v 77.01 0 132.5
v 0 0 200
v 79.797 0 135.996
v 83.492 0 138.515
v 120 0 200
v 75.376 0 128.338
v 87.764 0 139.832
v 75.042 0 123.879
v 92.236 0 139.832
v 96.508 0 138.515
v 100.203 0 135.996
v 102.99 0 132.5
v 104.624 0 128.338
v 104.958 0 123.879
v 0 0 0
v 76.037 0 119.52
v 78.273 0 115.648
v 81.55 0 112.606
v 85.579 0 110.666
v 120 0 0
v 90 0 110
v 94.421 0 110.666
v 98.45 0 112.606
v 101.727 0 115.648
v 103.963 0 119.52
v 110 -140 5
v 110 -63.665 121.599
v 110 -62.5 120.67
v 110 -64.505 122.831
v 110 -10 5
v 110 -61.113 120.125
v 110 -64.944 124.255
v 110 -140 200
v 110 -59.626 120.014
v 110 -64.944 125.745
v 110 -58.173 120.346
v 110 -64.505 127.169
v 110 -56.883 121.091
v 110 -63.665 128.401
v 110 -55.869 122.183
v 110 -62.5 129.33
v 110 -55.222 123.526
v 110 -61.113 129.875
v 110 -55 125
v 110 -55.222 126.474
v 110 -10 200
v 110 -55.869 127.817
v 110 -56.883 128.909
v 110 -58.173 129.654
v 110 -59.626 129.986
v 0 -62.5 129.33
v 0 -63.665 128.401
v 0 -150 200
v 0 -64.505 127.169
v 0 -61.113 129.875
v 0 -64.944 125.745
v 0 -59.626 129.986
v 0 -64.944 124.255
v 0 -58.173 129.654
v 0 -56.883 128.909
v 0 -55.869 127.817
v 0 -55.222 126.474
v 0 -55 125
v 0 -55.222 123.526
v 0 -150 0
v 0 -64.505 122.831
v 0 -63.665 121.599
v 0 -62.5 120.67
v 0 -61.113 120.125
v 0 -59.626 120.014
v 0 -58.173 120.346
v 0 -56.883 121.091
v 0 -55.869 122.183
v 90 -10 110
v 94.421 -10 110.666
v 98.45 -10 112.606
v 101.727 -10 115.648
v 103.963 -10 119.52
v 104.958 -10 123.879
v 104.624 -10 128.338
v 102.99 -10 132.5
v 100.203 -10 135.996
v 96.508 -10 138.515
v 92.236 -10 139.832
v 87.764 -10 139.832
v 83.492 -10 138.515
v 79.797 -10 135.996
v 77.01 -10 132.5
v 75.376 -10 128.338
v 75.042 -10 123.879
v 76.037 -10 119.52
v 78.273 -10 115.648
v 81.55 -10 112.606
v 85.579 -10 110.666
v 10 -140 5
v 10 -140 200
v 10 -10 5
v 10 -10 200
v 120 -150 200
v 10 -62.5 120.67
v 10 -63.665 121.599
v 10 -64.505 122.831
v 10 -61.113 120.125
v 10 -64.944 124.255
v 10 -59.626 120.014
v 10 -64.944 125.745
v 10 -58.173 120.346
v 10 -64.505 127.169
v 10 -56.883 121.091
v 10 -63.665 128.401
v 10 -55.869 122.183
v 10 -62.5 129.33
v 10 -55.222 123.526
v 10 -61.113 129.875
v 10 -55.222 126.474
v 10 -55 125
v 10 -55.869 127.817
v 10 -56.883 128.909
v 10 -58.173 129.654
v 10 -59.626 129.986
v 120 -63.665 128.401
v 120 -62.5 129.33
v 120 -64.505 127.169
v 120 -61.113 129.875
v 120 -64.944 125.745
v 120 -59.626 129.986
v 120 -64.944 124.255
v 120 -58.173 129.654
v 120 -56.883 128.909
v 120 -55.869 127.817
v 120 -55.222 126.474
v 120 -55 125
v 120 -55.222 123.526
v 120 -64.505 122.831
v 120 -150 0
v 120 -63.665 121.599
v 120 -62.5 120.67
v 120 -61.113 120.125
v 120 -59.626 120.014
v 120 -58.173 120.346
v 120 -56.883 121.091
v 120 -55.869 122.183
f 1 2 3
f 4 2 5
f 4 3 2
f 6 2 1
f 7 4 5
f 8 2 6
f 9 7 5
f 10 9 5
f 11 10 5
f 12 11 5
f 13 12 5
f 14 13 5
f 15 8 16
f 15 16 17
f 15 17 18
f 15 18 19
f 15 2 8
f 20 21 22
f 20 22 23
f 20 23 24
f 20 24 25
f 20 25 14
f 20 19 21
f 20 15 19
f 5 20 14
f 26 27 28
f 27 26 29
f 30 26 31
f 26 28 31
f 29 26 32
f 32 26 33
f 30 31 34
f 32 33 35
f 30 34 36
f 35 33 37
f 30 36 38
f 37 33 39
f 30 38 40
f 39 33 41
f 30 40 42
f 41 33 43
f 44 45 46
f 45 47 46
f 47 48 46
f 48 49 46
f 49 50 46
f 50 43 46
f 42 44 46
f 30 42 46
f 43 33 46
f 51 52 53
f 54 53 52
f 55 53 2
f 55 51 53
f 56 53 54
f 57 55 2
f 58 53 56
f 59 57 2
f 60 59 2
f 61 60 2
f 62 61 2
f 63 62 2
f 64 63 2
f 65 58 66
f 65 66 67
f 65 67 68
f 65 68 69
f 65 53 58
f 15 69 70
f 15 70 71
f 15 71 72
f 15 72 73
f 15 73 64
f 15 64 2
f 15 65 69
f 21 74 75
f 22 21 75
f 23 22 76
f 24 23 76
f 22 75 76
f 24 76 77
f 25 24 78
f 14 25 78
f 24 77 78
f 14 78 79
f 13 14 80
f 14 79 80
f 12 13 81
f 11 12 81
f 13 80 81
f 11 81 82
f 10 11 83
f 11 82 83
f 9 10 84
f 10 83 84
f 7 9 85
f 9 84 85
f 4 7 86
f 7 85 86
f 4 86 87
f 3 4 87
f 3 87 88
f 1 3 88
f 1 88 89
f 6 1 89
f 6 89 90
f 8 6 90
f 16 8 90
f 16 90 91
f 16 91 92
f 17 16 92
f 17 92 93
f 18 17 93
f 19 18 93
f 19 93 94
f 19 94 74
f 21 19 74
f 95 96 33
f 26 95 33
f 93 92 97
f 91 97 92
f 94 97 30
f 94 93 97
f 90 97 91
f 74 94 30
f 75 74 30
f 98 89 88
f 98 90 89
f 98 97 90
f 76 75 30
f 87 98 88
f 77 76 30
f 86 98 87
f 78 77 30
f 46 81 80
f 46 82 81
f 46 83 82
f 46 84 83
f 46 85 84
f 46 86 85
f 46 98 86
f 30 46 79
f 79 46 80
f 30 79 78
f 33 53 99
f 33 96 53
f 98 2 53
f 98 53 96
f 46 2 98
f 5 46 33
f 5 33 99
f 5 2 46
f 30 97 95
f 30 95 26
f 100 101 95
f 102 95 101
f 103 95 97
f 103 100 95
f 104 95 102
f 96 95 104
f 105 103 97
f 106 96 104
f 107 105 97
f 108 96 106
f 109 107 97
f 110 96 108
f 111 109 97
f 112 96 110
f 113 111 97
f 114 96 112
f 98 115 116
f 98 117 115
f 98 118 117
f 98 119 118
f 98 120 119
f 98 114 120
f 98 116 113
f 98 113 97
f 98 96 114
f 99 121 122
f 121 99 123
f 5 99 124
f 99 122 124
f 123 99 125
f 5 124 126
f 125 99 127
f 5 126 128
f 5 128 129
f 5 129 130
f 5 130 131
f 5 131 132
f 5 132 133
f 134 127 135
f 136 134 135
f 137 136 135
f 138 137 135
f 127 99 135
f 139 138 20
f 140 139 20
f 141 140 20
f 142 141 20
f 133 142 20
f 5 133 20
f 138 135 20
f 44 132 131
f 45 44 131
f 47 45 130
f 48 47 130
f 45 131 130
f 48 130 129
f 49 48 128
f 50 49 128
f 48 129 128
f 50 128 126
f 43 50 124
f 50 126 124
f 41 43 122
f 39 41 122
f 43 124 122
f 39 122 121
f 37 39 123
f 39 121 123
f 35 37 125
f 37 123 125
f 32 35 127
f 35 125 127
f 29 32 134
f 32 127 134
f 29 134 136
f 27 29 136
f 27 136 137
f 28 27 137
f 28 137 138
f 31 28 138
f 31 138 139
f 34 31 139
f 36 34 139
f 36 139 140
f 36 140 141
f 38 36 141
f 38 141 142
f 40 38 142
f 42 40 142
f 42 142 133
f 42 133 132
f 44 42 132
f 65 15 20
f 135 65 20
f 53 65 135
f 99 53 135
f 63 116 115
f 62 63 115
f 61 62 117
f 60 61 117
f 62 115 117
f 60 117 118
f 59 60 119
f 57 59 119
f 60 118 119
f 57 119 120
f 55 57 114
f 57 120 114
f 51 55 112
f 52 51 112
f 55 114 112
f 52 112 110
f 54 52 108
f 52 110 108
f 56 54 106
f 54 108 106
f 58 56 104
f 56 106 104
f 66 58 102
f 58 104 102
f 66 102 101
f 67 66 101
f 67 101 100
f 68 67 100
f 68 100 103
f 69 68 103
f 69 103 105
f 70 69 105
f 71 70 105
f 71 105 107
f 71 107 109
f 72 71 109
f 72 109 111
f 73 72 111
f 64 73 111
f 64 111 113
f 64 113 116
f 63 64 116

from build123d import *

# Parameters (mm, degrees)
SKETCH1_W           = 120
SKETCH1_H           = 150
BOSS_EXTRUDE1_DEPTH = 200
SKETCH2_W           = 100
SKETCH2_H           = 130
CUT_EXTRUDE1_DEPTH  = 195
SKETCH3_R           = 5
CUT_EXTRUDE2_DEPTH  = 120
CUT_EXTRUDE3_START  = -130
SKETCH4_R           = 15
CUT_EXTRUDE3_DEPTH  = 24


with BuildPart() as part:
    # Sketch1 → Boss-Extrude1 (new body)
    with BuildSketch(Plane.XY):
        with Locations((60, -75)):
            Rectangle(SKETCH1_W, SKETCH1_H)
    extrude(amount=BOSS_EXTRUDE1_DEPTH)

    # Sketch2 → Cut-Extrude1 (cut)
    with BuildSketch(Plane.XY.offset(200)):
        with Locations((60, -75)):
            Rectangle(SKETCH2_W, SKETCH2_H)
    extrude(amount=-CUT_EXTRUDE1_DEPTH, mode=Mode.SUBTRACT)

    # Sketch3 → Cut-Extrude2 (cut)
    with BuildSketch(Plane(origin=(120, 0, 0), x_dir=(0, 0, -1), z_dir=(1, 0, 0))):
        with Locations(Location((-125, -60, 0), (0, 0, 90))):
            Circle(SKETCH3_R)
    extrude(amount=-CUT_EXTRUDE2_DEPTH, mode=Mode.SUBTRACT)

    # Sketch4 → Cut-Extrude3 (cut)
    with BuildSketch(Plane.XZ.offset(150).offset(CUT_EXTRUDE3_START)):
        with Locations(Location((90, 125, 0), (0, 0, 270))):
            Circle(SKETCH4_R)
    extrude(amount=-CUT_EXTRUDE3_DEPTH, mode=Mode.SUBTRACT)


solid = part.part
